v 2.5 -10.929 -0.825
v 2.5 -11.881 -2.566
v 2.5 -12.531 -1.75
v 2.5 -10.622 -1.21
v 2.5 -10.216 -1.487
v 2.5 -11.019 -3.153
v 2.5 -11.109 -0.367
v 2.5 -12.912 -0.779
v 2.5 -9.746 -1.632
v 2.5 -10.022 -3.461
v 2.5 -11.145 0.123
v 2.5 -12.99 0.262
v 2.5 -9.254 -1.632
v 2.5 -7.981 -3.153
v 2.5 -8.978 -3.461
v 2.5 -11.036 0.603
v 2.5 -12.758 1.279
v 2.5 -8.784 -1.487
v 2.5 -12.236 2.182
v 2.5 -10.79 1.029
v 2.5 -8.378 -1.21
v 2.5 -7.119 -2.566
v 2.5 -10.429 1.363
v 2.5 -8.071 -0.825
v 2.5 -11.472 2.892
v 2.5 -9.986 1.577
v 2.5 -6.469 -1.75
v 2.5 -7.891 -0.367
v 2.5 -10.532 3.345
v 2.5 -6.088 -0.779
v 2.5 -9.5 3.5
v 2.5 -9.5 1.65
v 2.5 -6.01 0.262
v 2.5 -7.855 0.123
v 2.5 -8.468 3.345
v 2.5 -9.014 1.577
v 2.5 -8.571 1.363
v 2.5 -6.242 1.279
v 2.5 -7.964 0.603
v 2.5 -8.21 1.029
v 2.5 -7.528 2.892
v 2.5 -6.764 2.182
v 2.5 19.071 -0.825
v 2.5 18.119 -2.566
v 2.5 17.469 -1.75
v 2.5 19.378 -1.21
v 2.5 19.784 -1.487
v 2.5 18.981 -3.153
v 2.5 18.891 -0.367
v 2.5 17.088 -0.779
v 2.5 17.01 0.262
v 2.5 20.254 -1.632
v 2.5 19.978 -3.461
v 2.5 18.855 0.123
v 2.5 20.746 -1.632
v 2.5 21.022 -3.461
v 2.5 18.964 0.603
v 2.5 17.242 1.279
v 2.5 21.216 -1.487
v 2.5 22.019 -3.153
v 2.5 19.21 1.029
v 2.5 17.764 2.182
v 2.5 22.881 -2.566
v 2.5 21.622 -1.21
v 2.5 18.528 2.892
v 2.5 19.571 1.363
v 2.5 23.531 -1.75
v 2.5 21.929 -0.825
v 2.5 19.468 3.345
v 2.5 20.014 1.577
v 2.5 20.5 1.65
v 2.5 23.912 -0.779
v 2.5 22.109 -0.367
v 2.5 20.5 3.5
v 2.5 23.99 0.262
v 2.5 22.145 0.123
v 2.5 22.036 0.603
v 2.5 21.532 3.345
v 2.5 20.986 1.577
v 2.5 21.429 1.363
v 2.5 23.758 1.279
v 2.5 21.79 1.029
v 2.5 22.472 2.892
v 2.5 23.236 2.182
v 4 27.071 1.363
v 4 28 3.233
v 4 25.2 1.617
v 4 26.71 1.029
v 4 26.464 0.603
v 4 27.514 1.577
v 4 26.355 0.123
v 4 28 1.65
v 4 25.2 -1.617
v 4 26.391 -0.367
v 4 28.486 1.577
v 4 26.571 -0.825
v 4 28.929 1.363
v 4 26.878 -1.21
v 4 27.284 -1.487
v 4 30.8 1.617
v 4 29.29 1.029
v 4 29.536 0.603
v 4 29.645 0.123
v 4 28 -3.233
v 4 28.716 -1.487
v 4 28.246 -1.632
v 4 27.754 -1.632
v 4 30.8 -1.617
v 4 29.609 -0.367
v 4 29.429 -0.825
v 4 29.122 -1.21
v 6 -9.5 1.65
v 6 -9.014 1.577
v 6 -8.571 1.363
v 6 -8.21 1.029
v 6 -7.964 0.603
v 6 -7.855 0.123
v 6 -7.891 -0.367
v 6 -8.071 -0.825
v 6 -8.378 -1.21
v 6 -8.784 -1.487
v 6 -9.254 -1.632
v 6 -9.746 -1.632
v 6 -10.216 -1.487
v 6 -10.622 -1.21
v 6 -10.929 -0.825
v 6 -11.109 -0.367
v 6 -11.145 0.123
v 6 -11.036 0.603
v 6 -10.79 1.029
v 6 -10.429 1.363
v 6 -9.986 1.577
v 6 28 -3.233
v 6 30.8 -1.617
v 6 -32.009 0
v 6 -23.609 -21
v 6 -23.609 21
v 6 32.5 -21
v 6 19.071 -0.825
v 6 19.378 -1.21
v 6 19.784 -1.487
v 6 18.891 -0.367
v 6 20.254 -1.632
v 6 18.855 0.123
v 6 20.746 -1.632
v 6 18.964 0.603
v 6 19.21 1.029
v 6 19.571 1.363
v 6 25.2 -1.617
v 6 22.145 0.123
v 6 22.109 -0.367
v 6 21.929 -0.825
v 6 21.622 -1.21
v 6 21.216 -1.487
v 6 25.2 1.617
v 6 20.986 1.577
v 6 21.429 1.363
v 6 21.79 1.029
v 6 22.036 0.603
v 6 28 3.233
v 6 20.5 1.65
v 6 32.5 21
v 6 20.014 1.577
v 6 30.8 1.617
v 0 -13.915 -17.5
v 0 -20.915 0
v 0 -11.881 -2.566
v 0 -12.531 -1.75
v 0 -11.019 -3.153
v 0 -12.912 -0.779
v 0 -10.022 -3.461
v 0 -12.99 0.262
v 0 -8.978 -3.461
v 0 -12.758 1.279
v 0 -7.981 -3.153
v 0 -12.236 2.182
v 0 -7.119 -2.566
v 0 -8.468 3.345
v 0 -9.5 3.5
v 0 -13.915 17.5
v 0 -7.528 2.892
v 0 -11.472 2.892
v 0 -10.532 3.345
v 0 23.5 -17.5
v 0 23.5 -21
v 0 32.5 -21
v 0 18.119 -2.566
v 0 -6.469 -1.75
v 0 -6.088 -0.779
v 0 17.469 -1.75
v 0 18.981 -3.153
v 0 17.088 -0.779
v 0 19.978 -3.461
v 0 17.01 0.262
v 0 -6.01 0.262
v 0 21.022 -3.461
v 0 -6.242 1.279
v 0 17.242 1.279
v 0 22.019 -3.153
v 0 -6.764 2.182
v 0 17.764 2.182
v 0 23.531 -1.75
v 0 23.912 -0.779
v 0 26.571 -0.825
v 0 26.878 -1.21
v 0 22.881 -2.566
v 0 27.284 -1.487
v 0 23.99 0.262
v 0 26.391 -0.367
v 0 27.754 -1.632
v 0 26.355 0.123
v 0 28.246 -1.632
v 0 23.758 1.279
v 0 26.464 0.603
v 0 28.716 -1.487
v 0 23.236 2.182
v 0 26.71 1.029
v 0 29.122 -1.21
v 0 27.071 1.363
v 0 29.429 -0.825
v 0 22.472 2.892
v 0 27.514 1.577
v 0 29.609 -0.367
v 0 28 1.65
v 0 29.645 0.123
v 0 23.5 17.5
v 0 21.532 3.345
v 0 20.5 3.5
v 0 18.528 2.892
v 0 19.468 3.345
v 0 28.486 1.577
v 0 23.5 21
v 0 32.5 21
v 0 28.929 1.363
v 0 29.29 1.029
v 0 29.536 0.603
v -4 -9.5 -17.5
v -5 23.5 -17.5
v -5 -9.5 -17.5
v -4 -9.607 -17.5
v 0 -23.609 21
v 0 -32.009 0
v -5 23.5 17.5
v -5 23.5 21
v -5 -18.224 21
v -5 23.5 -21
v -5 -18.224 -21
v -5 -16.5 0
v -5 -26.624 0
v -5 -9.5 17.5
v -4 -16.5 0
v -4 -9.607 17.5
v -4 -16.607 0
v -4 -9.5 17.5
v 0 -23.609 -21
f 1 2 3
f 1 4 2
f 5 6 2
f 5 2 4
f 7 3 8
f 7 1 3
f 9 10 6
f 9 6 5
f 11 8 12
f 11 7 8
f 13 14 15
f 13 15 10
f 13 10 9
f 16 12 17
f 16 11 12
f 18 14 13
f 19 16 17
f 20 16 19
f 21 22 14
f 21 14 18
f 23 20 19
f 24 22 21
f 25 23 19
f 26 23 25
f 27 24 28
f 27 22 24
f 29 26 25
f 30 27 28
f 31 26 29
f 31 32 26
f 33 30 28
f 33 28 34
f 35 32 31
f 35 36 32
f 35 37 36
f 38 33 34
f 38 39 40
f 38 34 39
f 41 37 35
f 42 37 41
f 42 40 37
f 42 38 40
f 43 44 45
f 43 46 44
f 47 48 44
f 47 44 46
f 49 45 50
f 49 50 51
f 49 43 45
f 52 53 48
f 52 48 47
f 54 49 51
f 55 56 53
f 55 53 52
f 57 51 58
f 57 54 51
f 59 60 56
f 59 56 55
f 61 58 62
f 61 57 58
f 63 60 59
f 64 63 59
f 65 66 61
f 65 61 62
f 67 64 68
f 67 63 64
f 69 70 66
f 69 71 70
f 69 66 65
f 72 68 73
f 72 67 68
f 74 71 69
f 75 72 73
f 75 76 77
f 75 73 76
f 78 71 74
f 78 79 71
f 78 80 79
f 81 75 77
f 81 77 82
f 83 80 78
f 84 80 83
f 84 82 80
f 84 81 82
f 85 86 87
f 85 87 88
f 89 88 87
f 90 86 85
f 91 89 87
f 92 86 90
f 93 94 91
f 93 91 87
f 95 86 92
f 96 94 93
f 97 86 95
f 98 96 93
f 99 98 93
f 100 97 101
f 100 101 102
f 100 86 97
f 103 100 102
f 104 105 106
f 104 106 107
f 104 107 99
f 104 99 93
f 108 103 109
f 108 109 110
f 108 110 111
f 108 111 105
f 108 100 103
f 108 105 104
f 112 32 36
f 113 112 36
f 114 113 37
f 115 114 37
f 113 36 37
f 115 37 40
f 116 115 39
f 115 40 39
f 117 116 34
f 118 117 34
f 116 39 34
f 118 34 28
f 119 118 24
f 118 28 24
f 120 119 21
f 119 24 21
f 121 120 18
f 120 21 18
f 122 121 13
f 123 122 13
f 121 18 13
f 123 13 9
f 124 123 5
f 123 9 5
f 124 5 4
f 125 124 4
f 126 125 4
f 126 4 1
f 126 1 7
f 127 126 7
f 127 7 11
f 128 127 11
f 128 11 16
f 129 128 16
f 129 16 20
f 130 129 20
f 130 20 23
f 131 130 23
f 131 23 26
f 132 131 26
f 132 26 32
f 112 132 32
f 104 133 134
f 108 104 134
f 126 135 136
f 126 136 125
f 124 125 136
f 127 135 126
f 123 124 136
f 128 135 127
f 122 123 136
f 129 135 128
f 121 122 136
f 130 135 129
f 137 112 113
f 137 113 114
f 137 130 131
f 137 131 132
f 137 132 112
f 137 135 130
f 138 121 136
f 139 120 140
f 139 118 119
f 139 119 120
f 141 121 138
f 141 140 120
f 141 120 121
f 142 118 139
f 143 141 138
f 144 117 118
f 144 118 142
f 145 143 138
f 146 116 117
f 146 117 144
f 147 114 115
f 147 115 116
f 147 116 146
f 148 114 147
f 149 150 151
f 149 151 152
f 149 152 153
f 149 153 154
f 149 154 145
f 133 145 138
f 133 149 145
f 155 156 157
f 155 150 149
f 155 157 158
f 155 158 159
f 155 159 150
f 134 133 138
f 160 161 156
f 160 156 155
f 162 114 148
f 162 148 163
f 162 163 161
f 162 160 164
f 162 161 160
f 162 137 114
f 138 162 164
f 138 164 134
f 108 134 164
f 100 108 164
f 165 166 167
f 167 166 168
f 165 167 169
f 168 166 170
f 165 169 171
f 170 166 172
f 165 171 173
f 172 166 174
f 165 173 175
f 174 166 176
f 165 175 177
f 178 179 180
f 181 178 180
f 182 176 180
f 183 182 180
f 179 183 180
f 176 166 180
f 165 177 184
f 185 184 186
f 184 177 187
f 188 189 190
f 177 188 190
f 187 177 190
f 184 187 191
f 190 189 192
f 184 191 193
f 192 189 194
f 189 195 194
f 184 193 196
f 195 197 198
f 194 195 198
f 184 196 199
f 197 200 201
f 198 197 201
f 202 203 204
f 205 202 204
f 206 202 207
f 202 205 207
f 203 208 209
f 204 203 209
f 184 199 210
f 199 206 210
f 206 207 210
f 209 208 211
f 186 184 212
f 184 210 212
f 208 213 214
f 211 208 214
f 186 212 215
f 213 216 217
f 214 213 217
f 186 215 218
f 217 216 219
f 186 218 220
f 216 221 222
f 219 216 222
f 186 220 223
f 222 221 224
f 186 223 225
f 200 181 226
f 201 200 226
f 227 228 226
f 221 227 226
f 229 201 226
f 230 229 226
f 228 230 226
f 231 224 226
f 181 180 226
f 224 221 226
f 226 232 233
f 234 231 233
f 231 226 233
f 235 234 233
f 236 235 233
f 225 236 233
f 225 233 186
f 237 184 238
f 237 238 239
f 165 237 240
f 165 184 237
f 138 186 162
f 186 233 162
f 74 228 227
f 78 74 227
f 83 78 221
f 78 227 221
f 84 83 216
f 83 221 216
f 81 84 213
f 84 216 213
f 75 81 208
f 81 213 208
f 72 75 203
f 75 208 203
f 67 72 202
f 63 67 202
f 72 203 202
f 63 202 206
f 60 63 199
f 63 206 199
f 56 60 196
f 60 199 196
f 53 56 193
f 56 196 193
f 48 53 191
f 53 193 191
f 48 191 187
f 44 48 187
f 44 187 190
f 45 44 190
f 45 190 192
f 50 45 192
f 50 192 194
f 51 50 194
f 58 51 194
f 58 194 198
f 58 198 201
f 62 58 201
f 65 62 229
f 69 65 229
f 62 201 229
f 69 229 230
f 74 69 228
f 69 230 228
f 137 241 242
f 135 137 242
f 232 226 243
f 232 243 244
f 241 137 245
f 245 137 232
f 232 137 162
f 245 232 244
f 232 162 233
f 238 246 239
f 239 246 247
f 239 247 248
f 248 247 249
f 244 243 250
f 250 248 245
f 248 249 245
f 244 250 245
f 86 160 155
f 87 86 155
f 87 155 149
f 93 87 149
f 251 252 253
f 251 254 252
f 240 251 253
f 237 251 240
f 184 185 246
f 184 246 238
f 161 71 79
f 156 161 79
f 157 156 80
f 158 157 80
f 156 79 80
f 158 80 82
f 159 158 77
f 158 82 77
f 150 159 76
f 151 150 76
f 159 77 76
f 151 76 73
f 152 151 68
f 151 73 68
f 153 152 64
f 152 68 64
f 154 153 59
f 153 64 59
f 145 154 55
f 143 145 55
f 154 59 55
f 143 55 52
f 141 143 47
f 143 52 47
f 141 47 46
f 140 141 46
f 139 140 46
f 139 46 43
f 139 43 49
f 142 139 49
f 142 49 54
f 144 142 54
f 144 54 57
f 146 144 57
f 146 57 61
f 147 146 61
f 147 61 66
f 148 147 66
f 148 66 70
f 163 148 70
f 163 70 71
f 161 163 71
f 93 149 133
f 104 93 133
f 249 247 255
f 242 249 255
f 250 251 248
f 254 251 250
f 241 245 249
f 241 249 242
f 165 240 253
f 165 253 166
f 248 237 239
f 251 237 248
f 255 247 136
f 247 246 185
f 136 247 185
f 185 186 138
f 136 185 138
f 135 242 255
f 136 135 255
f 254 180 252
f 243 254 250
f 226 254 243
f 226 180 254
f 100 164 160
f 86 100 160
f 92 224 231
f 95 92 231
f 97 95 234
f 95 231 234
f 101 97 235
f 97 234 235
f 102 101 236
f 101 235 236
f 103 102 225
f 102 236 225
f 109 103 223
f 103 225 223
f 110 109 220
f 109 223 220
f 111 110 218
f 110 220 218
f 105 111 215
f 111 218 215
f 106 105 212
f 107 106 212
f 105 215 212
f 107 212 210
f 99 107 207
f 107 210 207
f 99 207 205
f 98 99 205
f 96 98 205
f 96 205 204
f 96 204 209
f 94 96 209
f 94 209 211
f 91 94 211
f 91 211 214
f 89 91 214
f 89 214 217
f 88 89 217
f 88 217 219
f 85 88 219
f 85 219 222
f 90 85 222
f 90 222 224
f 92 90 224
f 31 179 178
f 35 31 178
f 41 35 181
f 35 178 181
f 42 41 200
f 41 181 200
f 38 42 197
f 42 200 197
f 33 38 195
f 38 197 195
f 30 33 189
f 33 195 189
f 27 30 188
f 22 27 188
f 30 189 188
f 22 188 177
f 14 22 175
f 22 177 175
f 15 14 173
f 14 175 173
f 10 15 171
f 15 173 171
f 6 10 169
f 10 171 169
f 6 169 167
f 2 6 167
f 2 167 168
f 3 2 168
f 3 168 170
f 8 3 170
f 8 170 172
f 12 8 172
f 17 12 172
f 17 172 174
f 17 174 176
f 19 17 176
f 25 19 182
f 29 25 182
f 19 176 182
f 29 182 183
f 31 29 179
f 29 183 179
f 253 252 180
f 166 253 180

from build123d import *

# Parameters (mm, degrees)
ESBO_O1_W                = 6
ESBO_O1_H                = 65
RESSALTO_EXTRUS_O1_DEPTH = 21
RESSALTO_EXTRUS_O4_DEPTH = 5
CORTE_EXTRUS_O6_START    = -1
CORTE_EXTRUS_O6_DEPTH    = 4
CHANFRO1_SIZE            = 6.4
CHANFRO2_SIZE            = 6.4
ESBO_O15_R               = 1.65
CORTE_EXTRUS_O7_DEPTH    = 41.227478171
CORTE_EXTRUS_O8_DEPTH    = 2
ESBO_O17_R               = 3.5
CORTE_EXTRUS_O9_DEPTH    = 2.5
CORTE_EXTRUS_O10_DEPTH   = 40.15673633


with BuildPart() as part:
    # Esboço1 → Ressalto-extrusão1 (new, symmetric)
    with BuildSketch(Plane.XY):
        with Locations((3, 0)):
            Rectangle(ESBO_O1_W, ESBO_O1_H)
    extrude(amount=RESSALTO_EXTRUS_O1_DEPTH, both=True)

    # Esboço11 → Ressalto-extrusão4 (add)
    with BuildSketch(Plane.ZY):
        Polygon((-17.5, -9.5), (0, -16.5), (17.5, -9.5), (17.5, 23.5), (21, 23.5), (21, -16.716263691), (0, -25.116263691), (-21, -16.716263691), (-21, 23.5), (-17.5, 23.5), align=None)
    extrude(amount=RESSALTO_EXTRUS_O4_DEPTH)

    # Esboço12 → Corte-extrusão6 (cut)
    with BuildSketch(Plane.ZY.offset(5).offset(CORTE_EXTRUS_O6_START)):
        Polygon((-17.5, -9.5), (17.5, -9.5), (17.5, -16.5), (0, -23.5), (-17.5, -16.5), align=None)
    extrude(amount=-CORTE_EXTRUS_O6_DEPTH, mode=Mode.SUBTRACT)

    # Chanfro1
    # the kernel refuses this chamfer: 6.4 mm, written as the material it adds along each edge
    with BuildSketch(Plane(origin=(-4, -29.612634139, 15.281585348), x_dir=(-0.0274958766105864, 0.9281256495501803, 0.3712502598200724), z_dir=(0, 0.371390676354104, -0.9284766908852593))) as chanfro1_piece_1_section:
        Polygon((CHANFRO1_SIZE * 0.999621916911, CHANFRO1_SIZE * 0.0274958766106), (-CHANFRO1_SIZE * 0.0274958766106, CHANFRO1_SIZE * 0.999621916911), (0, 0), align=None)
    chanfro1_piece_1 = extrude(amount=51.765619071, mode=Mode.PRIVATE)
    chanfro1_piece_1 = split(chanfro1_piece_1, bisect_by=Plane(origin=(-1.981352532, -18.155988855, -17.5), z_dir=(0, 0, 1)), keep=Keep.TOP, mode=Mode.PRIVATE)
    chanfro1_piece_1 = split(chanfro1_piece_1, bisect_by=Plane(origin=(-1.981352532, -25.250248134, -4.375620334), z_dir=(0, 0.9284766908852594, -0.3713906763541037)), keep=Keep.TOP, mode=Mode.PRIVATE)
    add(chanfro1_piece_1)
    with BuildSketch(Plane(origin=(-4, -10.387365861, 32.781585348), x_dir=(-0.027495876610586396, 0.9281256495501804, -0.37125025982007215), z_dir=(0, -0.3713906763541037, -0.9284766908852594))) as chanfro1_piece_2_section:
        Polygon((CHANFRO1_SIZE * 0.999621916911, CHANFRO1_SIZE * 0.0274958766106), (-CHANFRO1_SIZE * 0.0274958766106, CHANFRO1_SIZE * 0.999621916911), (0, 0), align=None)
    chanfro1_piece_2 = extrude(amount=51.765619071, mode=Mode.PRIVATE)
    chanfro1_piece_2 = split(chanfro1_piece_2, bisect_by=Plane(origin=(-1.981352532, -18.155988855, 17.5), z_dir=(0, 0, -1)), keep=Keep.TOP, mode=Mode.PRIVATE)
    chanfro1_piece_2 = split(chanfro1_piece_2, bisect_by=Plane(origin=(-1.981352532, -25.250248134, 4.375620334), z_dir=(0, 0.9284766908852593, 0.371390676354104)), keep=Keep.TOP, mode=Mode.PRIVATE)
    add(chanfro1_piece_2)

    # Chanfro2
    # the kernel refuses this chamfer: 6.4 mm, written as the material it adds along each edge
    with BuildSketch(Plane(origin=(0, -31.228897831, 15.281585348), x_dir=(-0.9996219169112968, 0.025529280528386766, 0.010211712211354711), z_dir=(0, 0.37139067635410383, -0.9284766908852593))) as chanfro2_piece_1_section:
        Polygon((CHANFRO2_SIZE * 0.999621916911, -CHANFRO2_SIZE * 0.0274958766106), (-CHANFRO2_SIZE * 0.0274958766106, -CHANFRO2_SIZE * 0.999621916911), (0, 0), align=None)
    chanfro2_piece_1 = extrude(amount=55.535234436, mode=Mode.PRIVATE)
    chanfro2_piece_1 = split(chanfro2_piece_1, bisect_by=Plane(origin=(-5, -22.562055234, -11.871492952), z_dir=(1, 0, 0)), keep=Keep.TOP, mode=Mode.PRIVATE)
    chanfro2_piece_1 = split(chanfro2_piece_1, bisect_by=Plane(origin=(-1.967131821, -22.562055234, -21), z_dir=(0, 0, 1)), keep=Keep.TOP, mode=Mode.PRIVATE)
    chanfro2_piece_1 = split(chanfro2_piece_1, bisect_by=Plane(origin=(-1.967131821, -28.857577336, -9.353284111), z_dir=(0, 0.9284766908852593, -0.37139067635410383)), keep=Keep.TOP, mode=Mode.PRIVATE)
    add(chanfro2_piece_1)
    with BuildSketch(Plane(origin=(0, -10.603629552, 36.281585348), x_dir=(-0.9996219169112968, 0.02552928052838644, -0.010211712211354581), z_dir=(0, -0.37139067635410383, -0.9284766908852593))) as chanfro2_piece_2_section:
        Polygon((CHANFRO2_SIZE * 0.999621916911, -CHANFRO2_SIZE * 0.0274958766106), (-CHANFRO2_SIZE * 0.0274958766106, -CHANFRO2_SIZE * 0.999621916911), (0, 0), align=None)
    chanfro2_piece_2 = extrude(amount=55.535234436, mode=Mode.PRIVATE)
    chanfro2_piece_2 = split(chanfro2_piece_2, bisect_by=Plane(origin=(-5, -22.562055234, 11.871492952), z_dir=(1, 0, 0)), keep=Keep.TOP, mode=Mode.PRIVATE)
    chanfro2_piece_2 = split(chanfro2_piece_2, bisect_by=Plane(origin=(-1.967131821, -22.562055234, 21), z_dir=(0, 0, -1)), keep=Keep.TOP, mode=Mode.PRIVATE)
    chanfro2_piece_2 = split(chanfro2_piece_2, bisect_by=Plane(origin=(-1.967131821, -28.857577336, 9.353284111), z_dir=(0, 0.9284766908852593, 0.37139067635410383)), keep=Keep.TOP, mode=Mode.PRIVATE)
    add(chanfro2_piece_2)
    with BuildSketch(Plane(origin=(0, -10.603629552, 36.281585348), x_dir=(-0.9996219169112968, 0.02552928052838644, -0.010211712211354581), z_dir=(0, -0.37139067635410383, -0.9284766908852593))) as chanfro2_piece_3a_section:
        Polygon((CHANFRO2_SIZE * 0.999621916911, -CHANFRO2_SIZE * 0.0274958766106), (-CHANFRO2_SIZE * 0.0274958766106, -CHANFRO2_SIZE * 0.999621916911), (0, 0), align=None)
    chanfro2_piece_3a = extrude(amount=55.535234436, mode=Mode.PRIVATE)
    chanfro2_piece_3a = split(chanfro2_piece_3a, bisect_by=Plane(origin=(-5, -29.234460618, -4.706755421), z_dir=(1, 0, 0)), keep=Keep.TOP, mode=Mode.PRIVATE)
    chanfro2_piece_3a = split(chanfro2_piece_3a, bisect_by=Plane(origin=(-1.958615866, -24.061271743, -2.637479871), z_dir=(0, -0.9284766908852593, -0.37139067635410383)), keep=Keep.TOP, mode=Mode.PRIVATE)
    chanfro2_piece_3a = split(chanfro2_piece_3a, bisect_by=Plane(origin=(-1.958615866, -32.5, -4.706755421), z_dir=(0, 1, 0)), keep=Keep.TOP, mode=Mode.PRIVATE)
    with BuildSketch(Plane(origin=(0, -31.228897831, 15.281585348), x_dir=(-0.9996219169112968, 0.025529280528386766, 0.010211712211354711), z_dir=(0, 0.37139067635410383, -0.9284766908852593))) as chanfro2_piece_3b_section:
        Polygon((CHANFRO2_SIZE * 0.999621916911, -CHANFRO2_SIZE * 0.0274958766106), (-CHANFRO2_SIZE * 0.0274958766106, -CHANFRO2_SIZE * 0.999621916911), (0, 0), align=None)
    chanfro2_piece_3b = extrude(amount=55.535234436, mode=Mode.PRIVATE)
    chanfro2_piece_3b = split(chanfro2_piece_3b, bisect_by=Plane(origin=(-5, -29.234460618, 4.706755421), z_dir=(1, 0, 0)), keep=Keep.TOP, mode=Mode.PRIVATE)
    chanfro2_piece_3b = split(chanfro2_piece_3b, bisect_by=Plane(origin=(-1.958615866, -24.061271743, 2.637479871), z_dir=(0, -0.9284766908852593, 0.37139067635410383)), keep=Keep.TOP, mode=Mode.PRIVATE)
    chanfro2_piece_3b = split(chanfro2_piece_3b, bisect_by=Plane(origin=(-1.958615866, -32.5, 4.706755421), z_dir=(0, 1, 0)), keep=Keep.TOP, mode=Mode.PRIVATE)
    chanfro2_piece_3 = chanfro2_piece_3a & chanfro2_piece_3b
    add(chanfro2_piece_3)

    # Esboço15 → Corte-extrusão7 (cut, through all)
    with BuildSketch(Plane.ZY.offset(5)):
        with Locations((0, 28)):
            Circle(ESBO_O15_R)
        with Locations((0, 20.5)):
            Circle(ESBO_O15_R)
        with Locations((0, -9.5)):
            Circle(ESBO_O15_R)
    extrude(amount=-CORTE_EXTRUS_O7_DEPTH, mode=Mode.SUBTRACT)

    # Esboço16 → Corte-extrusão8 (cut)
    with BuildSketch(Plane(origin=(6, 0, 0), x_dir=(0, 0, -1), z_dir=(1, 0, 0))):
        Polygon((3.233161507, 28), (1.616580754, 30.8), (-1.616580754, 30.8), (-3.233161507, 28), (-1.616580754, 25.2), (1.616580754, 25.2), align=None)
    extrude(amount=-CORTE_EXTRUS_O8_DEPTH, mode=Mode.SUBTRACT)

    # Esboço17 → Corte-extrusão9 (cut)
    with BuildSketch(Plane.ZY):
        with Locations((0, 20.5)):
            Circle(ESBO_O17_R)
        with Locations((0, -9.5)):
            Circle(ESBO_O17_R)
    extrude(amount=-CORTE_EXTRUS_O9_DEPTH, mode=Mode.SUBTRACT)

    # Esboço18 → Corte-extrusão10 (cut, through all)
    with BuildSketch(Plane.ZY):
        Polygon((21, -23.609274645), (0, -32.009274645), (-21, -23.609274645), (-21, -32.5), (21, -32.5), align=None)
    extrude(amount=-CORTE_EXTRUS_O10_DEPTH, mode=Mode.SUBTRACT)


solid = part.part
